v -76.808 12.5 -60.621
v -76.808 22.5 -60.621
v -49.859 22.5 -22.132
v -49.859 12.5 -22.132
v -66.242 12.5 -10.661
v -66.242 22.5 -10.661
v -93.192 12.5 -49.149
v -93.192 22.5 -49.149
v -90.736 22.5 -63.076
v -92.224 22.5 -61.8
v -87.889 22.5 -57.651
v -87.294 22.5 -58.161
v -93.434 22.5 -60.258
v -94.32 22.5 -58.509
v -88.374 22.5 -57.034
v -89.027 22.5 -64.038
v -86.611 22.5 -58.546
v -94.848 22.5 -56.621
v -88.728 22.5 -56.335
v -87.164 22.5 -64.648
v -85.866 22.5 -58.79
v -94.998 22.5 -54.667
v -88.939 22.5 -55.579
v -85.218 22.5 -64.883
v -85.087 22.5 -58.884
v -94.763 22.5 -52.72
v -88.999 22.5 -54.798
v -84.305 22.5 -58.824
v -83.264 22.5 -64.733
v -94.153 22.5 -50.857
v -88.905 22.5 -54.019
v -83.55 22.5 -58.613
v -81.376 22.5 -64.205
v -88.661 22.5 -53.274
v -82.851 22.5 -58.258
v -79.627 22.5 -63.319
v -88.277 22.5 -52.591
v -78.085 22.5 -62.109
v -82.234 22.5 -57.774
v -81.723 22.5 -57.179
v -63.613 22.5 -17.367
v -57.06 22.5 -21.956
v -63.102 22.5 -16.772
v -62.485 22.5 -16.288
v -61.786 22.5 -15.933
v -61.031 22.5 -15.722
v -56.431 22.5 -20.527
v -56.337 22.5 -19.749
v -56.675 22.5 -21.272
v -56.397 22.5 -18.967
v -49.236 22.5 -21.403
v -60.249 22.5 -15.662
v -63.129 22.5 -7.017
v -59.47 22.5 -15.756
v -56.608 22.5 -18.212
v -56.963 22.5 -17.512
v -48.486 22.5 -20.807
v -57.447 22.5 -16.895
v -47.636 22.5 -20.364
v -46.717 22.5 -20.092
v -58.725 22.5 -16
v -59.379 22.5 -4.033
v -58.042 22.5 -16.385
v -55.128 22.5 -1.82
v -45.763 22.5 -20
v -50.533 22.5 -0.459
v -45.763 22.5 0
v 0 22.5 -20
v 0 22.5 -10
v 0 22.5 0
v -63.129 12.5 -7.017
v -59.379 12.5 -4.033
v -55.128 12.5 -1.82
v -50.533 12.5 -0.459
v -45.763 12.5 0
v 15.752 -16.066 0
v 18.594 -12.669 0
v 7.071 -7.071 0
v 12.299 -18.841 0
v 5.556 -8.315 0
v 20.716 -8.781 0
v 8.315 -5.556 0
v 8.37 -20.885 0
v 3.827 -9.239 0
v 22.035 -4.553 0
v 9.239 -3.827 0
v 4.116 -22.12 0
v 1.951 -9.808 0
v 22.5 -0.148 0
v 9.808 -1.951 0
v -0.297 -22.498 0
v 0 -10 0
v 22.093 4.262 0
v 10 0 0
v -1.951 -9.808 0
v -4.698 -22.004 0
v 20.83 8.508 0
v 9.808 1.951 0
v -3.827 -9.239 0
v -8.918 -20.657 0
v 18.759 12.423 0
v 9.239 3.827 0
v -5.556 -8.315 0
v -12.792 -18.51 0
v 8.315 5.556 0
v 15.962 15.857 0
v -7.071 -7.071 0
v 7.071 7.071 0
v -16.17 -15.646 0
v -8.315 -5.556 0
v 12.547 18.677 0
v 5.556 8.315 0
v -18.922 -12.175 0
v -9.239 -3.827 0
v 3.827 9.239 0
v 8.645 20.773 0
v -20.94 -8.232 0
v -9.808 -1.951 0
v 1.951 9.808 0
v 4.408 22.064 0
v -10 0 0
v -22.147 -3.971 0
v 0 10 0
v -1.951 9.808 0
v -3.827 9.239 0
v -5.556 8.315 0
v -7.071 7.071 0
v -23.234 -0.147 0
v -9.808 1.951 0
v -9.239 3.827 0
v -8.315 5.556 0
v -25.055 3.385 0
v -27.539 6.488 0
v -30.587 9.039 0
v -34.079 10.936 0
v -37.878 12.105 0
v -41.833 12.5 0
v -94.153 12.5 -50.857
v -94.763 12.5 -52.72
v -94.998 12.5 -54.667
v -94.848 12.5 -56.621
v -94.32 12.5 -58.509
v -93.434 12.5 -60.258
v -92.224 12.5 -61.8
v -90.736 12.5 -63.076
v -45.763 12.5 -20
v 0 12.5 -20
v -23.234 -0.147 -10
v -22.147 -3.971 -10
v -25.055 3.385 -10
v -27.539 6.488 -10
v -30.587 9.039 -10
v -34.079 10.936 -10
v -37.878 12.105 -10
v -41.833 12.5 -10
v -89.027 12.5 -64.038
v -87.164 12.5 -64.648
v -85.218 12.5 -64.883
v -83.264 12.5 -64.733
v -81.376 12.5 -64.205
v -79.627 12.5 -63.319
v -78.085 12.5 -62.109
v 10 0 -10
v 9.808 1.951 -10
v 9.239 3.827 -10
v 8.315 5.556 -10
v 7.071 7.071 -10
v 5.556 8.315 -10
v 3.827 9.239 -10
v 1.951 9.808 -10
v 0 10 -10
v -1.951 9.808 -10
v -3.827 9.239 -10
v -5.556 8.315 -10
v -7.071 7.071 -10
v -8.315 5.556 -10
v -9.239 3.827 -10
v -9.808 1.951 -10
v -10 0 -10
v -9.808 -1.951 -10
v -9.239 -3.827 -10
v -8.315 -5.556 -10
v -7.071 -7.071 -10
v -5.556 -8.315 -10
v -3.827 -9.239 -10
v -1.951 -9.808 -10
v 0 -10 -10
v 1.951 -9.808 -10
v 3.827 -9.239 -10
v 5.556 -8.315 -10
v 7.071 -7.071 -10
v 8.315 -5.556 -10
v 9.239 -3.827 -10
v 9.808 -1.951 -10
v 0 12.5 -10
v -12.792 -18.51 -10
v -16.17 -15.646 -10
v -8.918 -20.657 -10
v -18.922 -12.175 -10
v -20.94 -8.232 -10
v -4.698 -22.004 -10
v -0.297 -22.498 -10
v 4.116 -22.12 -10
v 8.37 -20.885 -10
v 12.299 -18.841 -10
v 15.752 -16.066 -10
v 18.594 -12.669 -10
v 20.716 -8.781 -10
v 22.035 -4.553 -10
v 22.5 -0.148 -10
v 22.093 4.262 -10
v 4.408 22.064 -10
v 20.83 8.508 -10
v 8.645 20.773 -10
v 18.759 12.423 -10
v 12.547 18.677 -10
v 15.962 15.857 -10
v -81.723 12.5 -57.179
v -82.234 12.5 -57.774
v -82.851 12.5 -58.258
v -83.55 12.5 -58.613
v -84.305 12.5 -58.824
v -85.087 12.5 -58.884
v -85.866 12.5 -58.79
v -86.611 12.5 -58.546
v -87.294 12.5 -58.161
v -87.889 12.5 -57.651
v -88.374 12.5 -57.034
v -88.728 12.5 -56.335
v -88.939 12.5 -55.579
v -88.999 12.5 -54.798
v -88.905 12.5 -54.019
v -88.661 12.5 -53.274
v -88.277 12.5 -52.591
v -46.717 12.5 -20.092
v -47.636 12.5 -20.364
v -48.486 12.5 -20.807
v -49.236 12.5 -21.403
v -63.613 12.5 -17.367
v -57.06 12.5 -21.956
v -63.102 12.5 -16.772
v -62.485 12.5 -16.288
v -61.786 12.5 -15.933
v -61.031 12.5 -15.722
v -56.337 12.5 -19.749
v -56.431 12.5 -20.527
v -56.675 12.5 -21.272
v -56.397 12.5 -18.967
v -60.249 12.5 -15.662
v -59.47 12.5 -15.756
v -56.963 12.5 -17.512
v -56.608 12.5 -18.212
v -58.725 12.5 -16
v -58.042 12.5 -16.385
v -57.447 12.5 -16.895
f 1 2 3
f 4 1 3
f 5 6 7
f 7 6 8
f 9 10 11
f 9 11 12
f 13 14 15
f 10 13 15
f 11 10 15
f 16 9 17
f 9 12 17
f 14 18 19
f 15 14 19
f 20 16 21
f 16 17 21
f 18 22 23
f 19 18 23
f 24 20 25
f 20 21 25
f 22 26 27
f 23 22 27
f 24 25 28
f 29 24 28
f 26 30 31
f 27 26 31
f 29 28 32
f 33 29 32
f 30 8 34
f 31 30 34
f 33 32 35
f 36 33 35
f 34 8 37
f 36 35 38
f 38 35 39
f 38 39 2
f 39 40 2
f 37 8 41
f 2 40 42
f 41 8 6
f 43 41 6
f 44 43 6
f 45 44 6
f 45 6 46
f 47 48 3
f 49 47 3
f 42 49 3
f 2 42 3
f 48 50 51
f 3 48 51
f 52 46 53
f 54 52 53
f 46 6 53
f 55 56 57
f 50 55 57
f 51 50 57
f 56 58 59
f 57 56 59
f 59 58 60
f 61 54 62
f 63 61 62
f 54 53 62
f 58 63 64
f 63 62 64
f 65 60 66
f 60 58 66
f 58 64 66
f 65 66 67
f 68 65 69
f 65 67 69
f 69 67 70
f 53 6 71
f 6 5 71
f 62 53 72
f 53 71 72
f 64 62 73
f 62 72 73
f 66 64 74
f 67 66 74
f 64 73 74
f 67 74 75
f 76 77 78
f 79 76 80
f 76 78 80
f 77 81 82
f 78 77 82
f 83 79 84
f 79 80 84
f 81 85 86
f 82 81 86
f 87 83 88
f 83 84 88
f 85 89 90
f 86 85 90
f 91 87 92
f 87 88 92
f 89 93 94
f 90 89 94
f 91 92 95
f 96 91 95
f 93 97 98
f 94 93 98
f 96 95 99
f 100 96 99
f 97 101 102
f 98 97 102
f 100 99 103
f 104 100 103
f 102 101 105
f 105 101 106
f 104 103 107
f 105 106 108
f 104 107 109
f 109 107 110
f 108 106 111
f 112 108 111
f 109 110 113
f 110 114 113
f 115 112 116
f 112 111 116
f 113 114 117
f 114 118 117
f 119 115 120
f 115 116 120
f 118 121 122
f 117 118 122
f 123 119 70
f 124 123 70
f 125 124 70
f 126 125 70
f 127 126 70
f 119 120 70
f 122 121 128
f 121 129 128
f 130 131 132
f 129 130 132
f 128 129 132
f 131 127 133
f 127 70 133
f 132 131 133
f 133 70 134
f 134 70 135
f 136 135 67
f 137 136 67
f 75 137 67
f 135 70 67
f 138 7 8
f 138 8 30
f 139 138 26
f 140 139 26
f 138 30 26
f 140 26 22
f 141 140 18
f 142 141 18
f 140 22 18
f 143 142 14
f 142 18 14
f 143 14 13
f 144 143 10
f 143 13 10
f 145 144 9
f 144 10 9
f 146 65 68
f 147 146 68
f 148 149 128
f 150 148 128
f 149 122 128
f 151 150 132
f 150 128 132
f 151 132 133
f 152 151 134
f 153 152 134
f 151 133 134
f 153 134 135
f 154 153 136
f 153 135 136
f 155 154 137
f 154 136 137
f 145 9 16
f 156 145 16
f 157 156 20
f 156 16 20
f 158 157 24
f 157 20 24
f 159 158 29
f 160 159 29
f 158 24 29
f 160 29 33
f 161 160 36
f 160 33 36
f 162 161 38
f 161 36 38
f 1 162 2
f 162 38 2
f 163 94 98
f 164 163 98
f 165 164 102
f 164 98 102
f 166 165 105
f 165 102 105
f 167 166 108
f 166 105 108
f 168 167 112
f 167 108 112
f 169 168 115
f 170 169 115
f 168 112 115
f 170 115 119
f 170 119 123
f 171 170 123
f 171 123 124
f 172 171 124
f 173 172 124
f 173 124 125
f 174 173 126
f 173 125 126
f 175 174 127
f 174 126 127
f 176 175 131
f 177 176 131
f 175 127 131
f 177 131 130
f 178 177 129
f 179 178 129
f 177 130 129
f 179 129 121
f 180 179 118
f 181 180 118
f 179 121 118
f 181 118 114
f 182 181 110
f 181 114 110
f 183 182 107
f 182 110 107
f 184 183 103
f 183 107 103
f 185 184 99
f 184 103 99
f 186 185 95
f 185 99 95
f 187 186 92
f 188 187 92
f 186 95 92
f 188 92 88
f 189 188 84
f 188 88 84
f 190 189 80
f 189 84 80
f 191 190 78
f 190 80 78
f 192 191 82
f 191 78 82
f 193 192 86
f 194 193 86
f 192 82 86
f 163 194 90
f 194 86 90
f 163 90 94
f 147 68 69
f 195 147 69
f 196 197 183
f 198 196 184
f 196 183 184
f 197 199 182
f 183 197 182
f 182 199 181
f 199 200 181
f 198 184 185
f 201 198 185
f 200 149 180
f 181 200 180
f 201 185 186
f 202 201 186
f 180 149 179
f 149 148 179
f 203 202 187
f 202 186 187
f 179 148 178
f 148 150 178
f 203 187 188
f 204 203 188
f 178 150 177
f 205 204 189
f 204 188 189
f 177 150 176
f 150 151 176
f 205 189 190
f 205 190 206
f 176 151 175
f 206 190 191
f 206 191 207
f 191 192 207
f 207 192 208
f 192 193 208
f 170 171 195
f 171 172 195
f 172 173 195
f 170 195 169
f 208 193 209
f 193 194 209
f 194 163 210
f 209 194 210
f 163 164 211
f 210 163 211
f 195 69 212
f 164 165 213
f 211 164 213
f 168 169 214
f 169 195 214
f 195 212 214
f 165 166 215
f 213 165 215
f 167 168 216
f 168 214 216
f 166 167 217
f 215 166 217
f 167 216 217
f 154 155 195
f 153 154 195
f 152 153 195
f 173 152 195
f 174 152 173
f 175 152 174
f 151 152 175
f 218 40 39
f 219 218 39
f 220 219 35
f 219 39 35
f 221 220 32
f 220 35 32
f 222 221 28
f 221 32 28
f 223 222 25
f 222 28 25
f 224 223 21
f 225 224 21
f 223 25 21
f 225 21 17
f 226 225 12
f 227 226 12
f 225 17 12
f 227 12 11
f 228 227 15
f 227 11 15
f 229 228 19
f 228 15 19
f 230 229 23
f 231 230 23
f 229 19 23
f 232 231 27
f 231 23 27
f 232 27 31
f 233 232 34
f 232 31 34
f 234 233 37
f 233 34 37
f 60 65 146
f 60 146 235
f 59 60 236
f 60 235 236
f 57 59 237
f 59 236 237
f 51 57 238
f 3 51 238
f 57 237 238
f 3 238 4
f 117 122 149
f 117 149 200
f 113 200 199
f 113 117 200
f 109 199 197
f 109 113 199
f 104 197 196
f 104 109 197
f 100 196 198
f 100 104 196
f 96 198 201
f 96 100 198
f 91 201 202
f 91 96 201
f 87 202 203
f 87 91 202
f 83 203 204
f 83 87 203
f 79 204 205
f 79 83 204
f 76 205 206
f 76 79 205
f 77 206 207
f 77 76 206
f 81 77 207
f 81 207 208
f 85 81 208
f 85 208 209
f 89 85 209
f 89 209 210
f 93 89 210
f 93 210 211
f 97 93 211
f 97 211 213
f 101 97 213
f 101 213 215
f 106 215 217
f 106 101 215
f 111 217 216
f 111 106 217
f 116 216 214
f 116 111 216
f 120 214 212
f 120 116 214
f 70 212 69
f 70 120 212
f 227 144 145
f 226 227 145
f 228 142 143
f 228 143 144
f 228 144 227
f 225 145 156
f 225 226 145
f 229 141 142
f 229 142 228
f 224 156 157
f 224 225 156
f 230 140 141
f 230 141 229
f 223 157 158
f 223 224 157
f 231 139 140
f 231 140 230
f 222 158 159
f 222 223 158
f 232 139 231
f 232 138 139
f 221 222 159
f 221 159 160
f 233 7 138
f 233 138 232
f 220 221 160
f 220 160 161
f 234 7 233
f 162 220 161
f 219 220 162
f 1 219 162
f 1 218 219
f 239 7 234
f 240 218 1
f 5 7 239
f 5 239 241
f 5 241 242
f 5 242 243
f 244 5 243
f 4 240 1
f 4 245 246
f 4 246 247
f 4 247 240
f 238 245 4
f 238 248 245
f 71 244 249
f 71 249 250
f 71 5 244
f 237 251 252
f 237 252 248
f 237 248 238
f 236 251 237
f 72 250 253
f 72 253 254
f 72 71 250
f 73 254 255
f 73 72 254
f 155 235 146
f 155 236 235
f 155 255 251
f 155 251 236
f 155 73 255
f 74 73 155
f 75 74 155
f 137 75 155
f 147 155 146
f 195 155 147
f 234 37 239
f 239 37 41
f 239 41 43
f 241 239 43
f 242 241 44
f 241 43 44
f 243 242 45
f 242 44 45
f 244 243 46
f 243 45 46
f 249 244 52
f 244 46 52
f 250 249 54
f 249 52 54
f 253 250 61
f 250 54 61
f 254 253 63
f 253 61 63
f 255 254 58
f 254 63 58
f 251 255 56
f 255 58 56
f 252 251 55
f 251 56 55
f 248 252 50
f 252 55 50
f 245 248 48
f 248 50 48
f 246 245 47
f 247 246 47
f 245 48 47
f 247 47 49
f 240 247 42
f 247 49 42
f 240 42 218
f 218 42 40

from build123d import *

# Parameters (mm, degrees)
F0_R     = 22.5
F0_R_2   = 10
F1_DEPTH = 10
F4_DEPTH = 10
F5_R     = 25
F6_R     = 5
F7_R     = 20


with BuildPart() as f1:
    # F0 (on Top) → F1 (new body)
    with BuildSketch(Plane.XY):
        Circle(F0_R)
        Circle(F0_R_2, mode=Mode.SUBTRACT)
    extrude(amount=-F1_DEPTH)

    # F3 (on offset) → F4 (join)
    with BuildSketch(Plane.XZ.offset(-22.5)):
        with BuildLine():
            Line((0, -20), (0, 0))
            Line((0, 0), (-58.776934, 0))
            Line((-58.776934, 0), (-93.19152, -49.149123))
            ThreePointArc((-93.19152, -49.149123), (-94.848078, -56.621369), (-90.735764, -63.076407))
            ThreePointArc((-90.735764, -63.076407), (-83.263518, -64.732965), (-76.80848, -60.620651))
            Line((-76.80848, -60.620651), (-48.365593, -20))
            Line((-48.365593, -20), (0, -20))
        make_face()
        with BuildLine():
            Line((-57.059605, -21.955655), (-81.723392, -57.179193))
            ThreePointArc((-81.723392, -57.179193), (-87.294306, -58.161495), (-88.276608, -52.590581))
            Line((-88.276608, -52.590581), (-63.612821, -17.367043))
            ThreePointArc((-63.612821, -17.367043), (-58.041907, -16.384741), (-57.059605, -21.955655))
        make_face(mode=Mode.SUBTRACT)
    extrude(amount=F4_DEPTH)

    # F5
    f5_edges = [f1.edges().sort_by_distance(p)[0] for p in [
        (-58.776934, 17.5, 0),
    ]]
    fillet(f5_edges, radius=F5_R)

    # F6
    f6_edges = [f1.edges().sort_by_distance(p)[0] for p in [
        (-48.365593, 17.5, -20),
    ]]
    fillet(f6_edges, radius=F6_R)

    # F7
    f7_edges = [f1.edges().sort_by_distance(p)[0] for p in [
        (-18.708287, 12.5, -5),
    ]]
    fillet(f7_edges, radius=F7_R)


solid = f1.part
